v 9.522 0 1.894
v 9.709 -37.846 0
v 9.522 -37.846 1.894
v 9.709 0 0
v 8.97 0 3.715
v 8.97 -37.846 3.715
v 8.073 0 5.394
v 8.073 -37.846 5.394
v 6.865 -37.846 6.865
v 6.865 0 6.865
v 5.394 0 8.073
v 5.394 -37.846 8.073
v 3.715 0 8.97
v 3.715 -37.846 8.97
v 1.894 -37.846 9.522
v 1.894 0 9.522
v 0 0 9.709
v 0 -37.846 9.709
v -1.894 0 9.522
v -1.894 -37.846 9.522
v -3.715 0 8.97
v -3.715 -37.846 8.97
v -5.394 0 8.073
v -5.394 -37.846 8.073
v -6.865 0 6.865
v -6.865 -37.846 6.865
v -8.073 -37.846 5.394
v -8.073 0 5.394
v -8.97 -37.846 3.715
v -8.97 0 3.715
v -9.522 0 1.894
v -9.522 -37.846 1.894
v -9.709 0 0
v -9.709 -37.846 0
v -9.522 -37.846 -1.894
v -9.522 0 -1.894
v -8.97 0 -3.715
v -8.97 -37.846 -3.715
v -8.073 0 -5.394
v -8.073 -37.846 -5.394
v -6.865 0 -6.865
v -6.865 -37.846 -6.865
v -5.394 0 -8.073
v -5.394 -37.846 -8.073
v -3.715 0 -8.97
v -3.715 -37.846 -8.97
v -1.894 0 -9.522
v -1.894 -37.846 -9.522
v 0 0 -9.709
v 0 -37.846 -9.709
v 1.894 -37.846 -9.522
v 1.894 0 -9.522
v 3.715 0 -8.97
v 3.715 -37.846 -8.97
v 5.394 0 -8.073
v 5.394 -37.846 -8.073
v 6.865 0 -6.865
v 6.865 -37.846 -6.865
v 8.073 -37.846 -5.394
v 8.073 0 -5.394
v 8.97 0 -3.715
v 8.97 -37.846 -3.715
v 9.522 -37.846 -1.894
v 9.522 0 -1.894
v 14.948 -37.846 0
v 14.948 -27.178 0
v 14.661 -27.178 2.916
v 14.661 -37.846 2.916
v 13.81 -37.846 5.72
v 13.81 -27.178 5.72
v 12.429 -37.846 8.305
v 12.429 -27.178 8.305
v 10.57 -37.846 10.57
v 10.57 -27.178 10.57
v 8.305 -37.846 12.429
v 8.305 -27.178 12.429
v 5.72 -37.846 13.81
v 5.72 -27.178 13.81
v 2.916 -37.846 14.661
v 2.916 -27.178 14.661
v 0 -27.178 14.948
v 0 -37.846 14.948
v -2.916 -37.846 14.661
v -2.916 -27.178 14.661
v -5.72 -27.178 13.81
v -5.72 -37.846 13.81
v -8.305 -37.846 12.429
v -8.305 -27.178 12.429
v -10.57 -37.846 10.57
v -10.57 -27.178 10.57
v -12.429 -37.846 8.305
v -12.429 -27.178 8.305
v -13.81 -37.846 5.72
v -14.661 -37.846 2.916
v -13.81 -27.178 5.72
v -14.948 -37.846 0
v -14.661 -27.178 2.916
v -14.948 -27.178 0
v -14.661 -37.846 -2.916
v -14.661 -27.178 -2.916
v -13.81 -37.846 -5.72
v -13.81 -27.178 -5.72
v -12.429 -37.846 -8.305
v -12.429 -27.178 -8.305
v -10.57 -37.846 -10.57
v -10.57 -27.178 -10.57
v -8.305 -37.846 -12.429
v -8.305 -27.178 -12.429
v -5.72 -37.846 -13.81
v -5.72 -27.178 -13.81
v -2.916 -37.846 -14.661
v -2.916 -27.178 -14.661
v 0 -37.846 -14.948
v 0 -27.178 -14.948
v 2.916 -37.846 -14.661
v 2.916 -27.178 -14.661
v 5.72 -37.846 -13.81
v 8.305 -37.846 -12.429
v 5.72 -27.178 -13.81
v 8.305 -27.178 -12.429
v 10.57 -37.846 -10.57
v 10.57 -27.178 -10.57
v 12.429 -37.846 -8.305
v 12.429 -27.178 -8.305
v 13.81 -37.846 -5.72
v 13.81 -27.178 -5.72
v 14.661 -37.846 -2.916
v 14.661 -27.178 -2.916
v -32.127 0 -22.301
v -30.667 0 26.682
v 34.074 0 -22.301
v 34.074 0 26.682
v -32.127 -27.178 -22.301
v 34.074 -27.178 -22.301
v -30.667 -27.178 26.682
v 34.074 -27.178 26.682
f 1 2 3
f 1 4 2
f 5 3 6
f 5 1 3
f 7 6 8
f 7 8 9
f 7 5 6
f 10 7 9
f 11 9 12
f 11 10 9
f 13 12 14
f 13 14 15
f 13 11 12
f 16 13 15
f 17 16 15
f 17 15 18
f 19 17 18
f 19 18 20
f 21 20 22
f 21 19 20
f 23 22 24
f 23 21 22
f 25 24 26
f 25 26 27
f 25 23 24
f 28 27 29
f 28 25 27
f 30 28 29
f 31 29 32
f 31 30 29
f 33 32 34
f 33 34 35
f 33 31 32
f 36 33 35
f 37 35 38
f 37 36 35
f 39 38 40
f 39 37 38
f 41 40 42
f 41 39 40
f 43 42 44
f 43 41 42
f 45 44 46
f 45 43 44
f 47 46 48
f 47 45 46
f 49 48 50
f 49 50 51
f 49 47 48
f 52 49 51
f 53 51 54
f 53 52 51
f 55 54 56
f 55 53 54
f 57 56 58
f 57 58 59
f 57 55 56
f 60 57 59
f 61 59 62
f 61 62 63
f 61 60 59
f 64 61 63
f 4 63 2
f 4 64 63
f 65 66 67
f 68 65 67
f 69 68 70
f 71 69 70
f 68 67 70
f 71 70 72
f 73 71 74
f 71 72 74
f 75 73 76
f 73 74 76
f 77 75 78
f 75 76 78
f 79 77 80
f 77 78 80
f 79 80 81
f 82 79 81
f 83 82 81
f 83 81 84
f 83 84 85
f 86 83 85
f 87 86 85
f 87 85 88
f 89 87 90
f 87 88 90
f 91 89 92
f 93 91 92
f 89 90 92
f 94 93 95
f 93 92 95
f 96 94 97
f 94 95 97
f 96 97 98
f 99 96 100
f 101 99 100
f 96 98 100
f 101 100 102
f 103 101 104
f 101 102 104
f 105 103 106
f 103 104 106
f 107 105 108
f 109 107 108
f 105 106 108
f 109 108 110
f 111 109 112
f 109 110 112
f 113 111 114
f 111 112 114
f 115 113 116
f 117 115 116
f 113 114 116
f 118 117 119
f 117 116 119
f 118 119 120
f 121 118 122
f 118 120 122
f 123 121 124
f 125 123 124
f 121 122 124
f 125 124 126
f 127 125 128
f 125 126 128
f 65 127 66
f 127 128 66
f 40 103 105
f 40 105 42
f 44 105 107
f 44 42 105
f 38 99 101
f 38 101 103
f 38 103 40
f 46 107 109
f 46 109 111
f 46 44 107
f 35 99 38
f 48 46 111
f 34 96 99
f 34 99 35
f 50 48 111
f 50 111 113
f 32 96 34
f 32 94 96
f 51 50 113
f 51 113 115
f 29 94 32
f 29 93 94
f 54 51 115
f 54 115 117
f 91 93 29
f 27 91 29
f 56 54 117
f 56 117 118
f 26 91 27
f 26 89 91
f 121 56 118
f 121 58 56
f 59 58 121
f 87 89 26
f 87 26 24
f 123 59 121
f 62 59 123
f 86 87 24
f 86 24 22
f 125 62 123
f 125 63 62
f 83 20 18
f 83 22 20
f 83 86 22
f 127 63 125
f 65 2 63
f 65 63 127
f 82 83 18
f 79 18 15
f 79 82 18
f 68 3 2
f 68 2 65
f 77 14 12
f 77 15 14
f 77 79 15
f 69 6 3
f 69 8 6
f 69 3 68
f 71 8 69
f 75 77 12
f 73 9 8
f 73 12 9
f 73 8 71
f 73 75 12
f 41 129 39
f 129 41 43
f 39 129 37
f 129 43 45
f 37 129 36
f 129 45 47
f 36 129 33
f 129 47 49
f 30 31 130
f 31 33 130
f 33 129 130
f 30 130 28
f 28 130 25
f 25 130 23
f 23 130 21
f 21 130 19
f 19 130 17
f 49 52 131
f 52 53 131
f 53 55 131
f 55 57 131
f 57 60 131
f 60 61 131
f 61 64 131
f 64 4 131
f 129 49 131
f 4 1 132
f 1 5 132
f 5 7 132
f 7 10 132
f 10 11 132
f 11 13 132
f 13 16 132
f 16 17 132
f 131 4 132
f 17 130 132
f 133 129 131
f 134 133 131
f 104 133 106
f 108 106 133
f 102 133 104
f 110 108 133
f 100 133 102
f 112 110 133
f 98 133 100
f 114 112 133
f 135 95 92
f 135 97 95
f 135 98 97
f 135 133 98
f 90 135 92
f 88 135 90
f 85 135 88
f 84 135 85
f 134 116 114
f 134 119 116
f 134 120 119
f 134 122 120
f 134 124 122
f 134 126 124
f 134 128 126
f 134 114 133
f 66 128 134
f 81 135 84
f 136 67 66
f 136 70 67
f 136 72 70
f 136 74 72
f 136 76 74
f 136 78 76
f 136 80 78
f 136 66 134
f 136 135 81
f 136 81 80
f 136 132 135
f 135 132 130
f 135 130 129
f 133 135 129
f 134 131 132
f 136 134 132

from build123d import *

# Parameters (mm, degrees)
F0_R     = 9.708725
F1_DEPTH = 27.178
F2_R     = 14.948312
F2_R_2   = 9.708725
F3_DEPTH = 10.668


with BuildPart() as f1:
    # F0 (on Front) → F1 (new body)
    with BuildSketch(Plane.XZ):
        Polygon((34.074262, 26.681835), (-30.666837, 26.681835), (-32.127164, -22.300858), (34.074262, -22.300858), align=None)
        Circle(F0_R, mode=Mode.SUBTRACT)
    extrude(amount=F1_DEPTH)

    # F2 (on face) → F3 (join)
    with BuildSketch(Plane.XZ.offset(27.178)):
        Circle(F2_R)
        Circle(F2_R_2, mode=Mode.SUBTRACT)
    extrude(amount=F3_DEPTH)


solid = f1.part
